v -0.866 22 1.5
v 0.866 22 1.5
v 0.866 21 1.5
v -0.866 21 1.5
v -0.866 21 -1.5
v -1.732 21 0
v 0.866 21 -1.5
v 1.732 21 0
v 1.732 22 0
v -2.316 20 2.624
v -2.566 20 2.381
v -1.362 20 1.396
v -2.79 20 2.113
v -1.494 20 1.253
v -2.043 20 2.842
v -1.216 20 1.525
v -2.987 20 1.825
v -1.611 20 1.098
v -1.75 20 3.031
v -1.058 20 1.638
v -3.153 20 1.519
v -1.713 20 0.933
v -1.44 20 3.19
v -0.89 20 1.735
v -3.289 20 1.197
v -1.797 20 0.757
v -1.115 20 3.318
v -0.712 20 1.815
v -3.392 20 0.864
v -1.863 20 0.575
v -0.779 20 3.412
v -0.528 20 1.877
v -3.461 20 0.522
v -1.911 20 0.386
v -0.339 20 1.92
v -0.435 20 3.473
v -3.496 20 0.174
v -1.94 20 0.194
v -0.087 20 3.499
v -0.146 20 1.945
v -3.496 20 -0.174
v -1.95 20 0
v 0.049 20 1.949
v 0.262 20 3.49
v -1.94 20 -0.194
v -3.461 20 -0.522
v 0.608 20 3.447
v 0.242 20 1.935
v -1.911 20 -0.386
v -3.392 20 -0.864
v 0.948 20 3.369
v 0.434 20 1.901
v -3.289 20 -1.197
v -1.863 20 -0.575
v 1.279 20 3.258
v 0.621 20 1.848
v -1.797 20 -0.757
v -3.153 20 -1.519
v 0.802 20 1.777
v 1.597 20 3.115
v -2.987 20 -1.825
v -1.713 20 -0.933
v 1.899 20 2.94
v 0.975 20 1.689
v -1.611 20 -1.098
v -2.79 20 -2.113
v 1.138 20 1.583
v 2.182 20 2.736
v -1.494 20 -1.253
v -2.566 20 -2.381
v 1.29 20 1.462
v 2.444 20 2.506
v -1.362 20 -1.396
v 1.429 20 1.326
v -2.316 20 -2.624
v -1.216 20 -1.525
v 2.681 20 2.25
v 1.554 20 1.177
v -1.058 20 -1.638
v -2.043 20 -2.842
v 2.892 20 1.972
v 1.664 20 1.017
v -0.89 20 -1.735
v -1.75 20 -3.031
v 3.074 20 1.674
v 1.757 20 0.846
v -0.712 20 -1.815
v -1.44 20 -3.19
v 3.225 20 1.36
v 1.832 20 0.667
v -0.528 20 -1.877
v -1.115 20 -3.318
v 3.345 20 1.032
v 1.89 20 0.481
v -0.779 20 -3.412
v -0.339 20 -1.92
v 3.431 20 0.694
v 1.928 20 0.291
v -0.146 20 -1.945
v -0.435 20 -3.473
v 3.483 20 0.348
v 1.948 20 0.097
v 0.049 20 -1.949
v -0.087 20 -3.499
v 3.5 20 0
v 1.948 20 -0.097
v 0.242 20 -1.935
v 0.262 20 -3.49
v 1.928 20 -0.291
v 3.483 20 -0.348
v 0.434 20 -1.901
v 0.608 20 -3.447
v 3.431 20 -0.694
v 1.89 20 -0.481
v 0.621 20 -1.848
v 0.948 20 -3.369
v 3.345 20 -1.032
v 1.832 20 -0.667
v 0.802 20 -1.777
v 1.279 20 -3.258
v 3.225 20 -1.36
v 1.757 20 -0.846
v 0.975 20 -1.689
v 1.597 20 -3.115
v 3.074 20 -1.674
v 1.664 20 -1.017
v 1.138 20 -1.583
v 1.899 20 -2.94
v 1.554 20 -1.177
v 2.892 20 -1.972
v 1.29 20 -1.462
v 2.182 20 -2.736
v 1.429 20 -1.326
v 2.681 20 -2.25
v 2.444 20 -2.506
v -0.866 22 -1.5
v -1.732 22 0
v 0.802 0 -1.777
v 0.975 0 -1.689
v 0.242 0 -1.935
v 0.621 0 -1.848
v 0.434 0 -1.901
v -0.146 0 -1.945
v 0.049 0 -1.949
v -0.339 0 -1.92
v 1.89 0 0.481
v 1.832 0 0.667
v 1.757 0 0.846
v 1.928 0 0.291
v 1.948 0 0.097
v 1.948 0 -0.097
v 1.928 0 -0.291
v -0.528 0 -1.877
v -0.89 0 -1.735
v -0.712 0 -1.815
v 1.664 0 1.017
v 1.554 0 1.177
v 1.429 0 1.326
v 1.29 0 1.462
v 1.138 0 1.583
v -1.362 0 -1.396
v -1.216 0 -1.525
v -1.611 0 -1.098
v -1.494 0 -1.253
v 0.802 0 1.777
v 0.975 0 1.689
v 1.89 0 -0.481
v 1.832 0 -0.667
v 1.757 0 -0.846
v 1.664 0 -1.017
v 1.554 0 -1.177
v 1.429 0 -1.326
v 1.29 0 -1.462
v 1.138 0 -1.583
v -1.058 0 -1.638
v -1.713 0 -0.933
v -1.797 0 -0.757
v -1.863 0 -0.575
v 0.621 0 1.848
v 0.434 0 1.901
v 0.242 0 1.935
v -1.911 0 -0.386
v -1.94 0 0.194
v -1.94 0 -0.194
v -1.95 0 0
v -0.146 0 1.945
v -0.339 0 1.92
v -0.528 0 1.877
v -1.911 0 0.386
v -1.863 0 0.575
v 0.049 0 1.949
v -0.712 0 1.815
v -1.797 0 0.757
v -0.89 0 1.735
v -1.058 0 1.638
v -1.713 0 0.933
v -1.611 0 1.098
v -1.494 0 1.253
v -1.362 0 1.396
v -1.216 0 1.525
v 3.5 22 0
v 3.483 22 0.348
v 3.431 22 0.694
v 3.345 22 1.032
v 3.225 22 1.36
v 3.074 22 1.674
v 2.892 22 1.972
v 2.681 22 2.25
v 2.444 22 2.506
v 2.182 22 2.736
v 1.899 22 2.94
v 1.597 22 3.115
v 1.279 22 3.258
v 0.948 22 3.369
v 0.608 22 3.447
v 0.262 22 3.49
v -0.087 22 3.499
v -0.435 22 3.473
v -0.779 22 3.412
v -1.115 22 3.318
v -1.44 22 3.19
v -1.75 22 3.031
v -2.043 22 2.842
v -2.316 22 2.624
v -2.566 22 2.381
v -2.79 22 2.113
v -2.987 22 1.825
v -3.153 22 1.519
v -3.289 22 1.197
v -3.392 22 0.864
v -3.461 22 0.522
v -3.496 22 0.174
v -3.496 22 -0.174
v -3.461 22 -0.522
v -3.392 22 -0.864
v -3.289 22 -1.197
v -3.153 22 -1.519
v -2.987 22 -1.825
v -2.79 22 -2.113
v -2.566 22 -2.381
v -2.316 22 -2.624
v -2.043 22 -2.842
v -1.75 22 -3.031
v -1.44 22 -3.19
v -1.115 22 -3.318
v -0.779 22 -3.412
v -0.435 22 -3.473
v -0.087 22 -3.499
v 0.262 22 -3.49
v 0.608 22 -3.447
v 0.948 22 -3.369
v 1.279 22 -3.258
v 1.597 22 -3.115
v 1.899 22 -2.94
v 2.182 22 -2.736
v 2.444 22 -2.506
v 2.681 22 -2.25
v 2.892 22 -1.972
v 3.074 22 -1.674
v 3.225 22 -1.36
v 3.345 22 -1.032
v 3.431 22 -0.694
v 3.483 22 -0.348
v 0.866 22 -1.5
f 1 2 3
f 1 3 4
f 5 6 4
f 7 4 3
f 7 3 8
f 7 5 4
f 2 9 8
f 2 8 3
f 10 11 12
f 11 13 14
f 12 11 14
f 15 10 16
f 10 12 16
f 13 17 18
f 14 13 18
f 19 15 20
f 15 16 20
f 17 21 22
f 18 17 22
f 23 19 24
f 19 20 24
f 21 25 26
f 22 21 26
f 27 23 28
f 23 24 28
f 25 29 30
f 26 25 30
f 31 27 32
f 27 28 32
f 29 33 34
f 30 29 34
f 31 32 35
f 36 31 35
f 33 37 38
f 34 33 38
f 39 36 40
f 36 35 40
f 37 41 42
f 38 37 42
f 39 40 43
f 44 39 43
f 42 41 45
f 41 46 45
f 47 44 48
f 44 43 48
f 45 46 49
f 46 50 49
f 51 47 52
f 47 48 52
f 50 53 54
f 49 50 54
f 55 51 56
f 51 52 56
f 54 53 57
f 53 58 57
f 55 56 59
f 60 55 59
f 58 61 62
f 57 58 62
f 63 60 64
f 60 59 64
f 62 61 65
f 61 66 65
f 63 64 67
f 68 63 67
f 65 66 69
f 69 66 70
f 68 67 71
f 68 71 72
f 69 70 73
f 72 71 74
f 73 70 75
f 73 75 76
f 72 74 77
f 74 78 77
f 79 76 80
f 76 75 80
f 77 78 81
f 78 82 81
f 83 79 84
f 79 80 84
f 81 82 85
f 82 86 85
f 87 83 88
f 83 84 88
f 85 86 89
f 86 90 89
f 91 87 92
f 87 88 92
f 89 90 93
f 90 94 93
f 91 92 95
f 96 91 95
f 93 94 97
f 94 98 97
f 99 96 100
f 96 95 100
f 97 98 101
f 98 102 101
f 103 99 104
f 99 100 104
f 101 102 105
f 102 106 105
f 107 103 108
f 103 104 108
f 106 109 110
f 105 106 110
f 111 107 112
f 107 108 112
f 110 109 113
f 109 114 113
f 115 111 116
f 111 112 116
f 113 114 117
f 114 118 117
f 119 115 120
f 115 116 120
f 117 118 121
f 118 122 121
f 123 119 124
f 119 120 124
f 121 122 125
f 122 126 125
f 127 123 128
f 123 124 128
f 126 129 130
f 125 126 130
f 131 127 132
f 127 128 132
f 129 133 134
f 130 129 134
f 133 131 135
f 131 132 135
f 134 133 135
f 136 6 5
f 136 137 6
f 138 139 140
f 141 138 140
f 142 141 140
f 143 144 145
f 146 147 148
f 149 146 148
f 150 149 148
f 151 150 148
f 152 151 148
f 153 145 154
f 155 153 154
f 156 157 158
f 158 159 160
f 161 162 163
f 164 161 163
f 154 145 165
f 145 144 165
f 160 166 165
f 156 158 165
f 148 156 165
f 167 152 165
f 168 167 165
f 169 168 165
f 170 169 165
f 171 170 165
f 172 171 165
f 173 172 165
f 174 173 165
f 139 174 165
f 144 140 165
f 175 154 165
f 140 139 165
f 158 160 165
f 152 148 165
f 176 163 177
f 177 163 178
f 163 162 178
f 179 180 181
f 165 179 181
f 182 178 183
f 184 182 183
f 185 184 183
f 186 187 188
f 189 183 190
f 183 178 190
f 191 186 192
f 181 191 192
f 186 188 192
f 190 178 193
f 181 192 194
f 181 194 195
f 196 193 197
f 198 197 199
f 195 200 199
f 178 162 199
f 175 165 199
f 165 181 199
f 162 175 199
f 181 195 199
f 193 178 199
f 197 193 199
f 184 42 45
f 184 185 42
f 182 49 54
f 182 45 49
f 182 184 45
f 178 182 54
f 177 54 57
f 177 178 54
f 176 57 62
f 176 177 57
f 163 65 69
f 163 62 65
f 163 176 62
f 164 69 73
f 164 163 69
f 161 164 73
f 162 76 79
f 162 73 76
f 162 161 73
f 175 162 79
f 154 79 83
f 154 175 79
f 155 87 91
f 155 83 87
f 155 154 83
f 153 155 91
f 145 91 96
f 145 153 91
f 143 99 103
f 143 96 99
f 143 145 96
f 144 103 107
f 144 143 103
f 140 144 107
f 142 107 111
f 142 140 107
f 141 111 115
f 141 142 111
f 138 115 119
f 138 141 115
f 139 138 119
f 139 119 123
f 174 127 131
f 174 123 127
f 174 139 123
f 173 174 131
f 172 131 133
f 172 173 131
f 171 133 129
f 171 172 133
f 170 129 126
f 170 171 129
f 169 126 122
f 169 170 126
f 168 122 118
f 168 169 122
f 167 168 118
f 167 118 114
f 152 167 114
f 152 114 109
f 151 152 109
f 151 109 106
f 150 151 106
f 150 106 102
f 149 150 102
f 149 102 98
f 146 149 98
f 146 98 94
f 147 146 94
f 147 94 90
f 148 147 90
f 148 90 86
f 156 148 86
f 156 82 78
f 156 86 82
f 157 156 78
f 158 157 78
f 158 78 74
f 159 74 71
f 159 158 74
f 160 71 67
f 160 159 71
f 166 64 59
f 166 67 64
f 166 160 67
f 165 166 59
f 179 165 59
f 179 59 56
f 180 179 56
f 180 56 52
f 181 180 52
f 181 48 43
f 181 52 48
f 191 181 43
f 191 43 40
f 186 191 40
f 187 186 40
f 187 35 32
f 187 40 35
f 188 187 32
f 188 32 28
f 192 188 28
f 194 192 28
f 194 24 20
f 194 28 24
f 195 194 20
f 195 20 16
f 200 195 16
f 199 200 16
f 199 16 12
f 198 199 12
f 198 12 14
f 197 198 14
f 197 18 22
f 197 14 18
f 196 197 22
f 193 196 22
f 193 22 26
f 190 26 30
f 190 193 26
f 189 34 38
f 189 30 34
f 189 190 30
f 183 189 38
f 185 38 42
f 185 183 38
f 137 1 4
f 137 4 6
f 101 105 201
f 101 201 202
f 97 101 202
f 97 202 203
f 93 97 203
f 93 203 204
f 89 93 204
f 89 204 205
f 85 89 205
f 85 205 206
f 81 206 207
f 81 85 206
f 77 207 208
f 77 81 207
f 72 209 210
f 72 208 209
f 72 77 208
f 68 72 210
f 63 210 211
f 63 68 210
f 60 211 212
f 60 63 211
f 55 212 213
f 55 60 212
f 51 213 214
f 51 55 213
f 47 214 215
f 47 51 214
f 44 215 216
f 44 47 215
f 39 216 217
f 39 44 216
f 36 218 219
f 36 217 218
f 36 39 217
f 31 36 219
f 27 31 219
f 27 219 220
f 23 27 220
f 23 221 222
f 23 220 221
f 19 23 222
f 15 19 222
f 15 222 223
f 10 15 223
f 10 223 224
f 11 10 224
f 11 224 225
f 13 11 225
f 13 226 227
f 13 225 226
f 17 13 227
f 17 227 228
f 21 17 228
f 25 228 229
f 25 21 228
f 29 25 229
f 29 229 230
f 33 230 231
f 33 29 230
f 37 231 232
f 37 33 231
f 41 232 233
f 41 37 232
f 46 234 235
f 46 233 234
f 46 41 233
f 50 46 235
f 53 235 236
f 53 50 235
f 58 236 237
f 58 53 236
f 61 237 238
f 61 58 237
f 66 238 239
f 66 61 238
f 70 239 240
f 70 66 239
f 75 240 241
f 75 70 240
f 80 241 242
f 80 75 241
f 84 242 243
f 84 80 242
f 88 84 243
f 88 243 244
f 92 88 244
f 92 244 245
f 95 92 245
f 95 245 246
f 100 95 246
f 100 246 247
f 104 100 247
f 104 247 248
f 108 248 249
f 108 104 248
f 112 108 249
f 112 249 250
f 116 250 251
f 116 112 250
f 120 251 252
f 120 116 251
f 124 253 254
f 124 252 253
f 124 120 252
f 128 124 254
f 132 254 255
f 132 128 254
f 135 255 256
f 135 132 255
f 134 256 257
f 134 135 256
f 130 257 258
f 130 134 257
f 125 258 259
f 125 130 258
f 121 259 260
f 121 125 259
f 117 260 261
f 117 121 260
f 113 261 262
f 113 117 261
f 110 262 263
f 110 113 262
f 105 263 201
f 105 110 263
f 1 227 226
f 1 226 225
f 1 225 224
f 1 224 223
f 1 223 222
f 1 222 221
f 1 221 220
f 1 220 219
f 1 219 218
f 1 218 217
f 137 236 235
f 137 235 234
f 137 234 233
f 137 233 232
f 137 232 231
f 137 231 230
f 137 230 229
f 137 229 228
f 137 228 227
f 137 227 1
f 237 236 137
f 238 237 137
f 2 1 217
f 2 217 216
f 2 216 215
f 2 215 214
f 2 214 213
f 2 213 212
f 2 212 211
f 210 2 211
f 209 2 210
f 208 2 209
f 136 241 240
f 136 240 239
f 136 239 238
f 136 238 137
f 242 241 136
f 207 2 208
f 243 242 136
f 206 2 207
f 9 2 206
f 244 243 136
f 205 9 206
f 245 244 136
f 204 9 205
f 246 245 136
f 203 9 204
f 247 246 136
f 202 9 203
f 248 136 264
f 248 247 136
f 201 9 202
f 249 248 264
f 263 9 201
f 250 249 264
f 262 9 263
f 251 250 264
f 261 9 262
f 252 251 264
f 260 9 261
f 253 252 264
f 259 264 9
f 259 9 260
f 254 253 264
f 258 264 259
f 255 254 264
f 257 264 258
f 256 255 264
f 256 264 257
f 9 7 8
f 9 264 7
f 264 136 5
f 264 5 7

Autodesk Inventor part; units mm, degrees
ref_plane "YZ Plane" through (0, 0, 0) normal (1, 0, 0) x (0, 1, 0)
ref_plane "XZ Plane" through (0, 0, 0) normal (0, 1, 0) x (-1, 0, 0)
ref_plane "XY Plane" through (0, 0, 0) normal (0, 0, 1) x (1, 0, 0)
sketch "Sketch1" plane through (0, 0, 0) normal (0, 1, 0) x (-1, 0, 0)
  circle A0 centre (0, 0) radius 1.95
  dimension "d0" = 3.9
extrude "Extrusion1" add sketch "Sketch1" along normal blind 20
sketch "Sketch2" plane through (0, 20, 0) normal (0, 1, 0) x (1, 0, 0)
  circle A0 centre (0, 0) radius 3.5
  dimension "d3" = 7
extrude "Extrusion2" add sketch "Sketch2" along normal blind 2
thread "Thread1" size "M5x0.8" class "6g" standard "ANSI Metric M Profile" full length
sketch "Sketch3" plane through (0, 22, 0) normal (0, 1, 0) x (1, 0, 0)
  line L0 (0.866, 1.5) -> (1.7321, 0)
  line L1 (1.7321, 0) -> (0.866, -1.5)
  line L2 (0.866, -1.5) -> (-0.866, -1.5)
  line L3 (-0.866, -1.5) -> (-1.7321, 0)
  line L4 (-1.7321, 0) -> (-0.866, 1.5)
  line L5 (-0.866, 1.5) -> (0.866, 1.5)
  point P0 (0, 0)
  point P1 (0, 0)
  dimension "d8" = 3
extrude "Extrusion3" cut sketch "Sketch3" against normal blind 1
equation "\"BendRadius\" = Thickness"
equation "\"BendReliefWidth\" = Thickness"
equation "\"BendReliefDepth\" = 0.5 * Thickness"
equation "\"CornerReliefSize\" = 4 * Thickness"
equation "\"MinimumRemnant\" = 2 * Thickness"
equation "\"TransitionRadius\" = BendRadius"
equation "\"JacobiRadiusSize\" = BendRadius"
equation "\"GapSize\" = Thickness"
equation "\"Thickness\" = 0.5"
properties part number "perno_simple"
